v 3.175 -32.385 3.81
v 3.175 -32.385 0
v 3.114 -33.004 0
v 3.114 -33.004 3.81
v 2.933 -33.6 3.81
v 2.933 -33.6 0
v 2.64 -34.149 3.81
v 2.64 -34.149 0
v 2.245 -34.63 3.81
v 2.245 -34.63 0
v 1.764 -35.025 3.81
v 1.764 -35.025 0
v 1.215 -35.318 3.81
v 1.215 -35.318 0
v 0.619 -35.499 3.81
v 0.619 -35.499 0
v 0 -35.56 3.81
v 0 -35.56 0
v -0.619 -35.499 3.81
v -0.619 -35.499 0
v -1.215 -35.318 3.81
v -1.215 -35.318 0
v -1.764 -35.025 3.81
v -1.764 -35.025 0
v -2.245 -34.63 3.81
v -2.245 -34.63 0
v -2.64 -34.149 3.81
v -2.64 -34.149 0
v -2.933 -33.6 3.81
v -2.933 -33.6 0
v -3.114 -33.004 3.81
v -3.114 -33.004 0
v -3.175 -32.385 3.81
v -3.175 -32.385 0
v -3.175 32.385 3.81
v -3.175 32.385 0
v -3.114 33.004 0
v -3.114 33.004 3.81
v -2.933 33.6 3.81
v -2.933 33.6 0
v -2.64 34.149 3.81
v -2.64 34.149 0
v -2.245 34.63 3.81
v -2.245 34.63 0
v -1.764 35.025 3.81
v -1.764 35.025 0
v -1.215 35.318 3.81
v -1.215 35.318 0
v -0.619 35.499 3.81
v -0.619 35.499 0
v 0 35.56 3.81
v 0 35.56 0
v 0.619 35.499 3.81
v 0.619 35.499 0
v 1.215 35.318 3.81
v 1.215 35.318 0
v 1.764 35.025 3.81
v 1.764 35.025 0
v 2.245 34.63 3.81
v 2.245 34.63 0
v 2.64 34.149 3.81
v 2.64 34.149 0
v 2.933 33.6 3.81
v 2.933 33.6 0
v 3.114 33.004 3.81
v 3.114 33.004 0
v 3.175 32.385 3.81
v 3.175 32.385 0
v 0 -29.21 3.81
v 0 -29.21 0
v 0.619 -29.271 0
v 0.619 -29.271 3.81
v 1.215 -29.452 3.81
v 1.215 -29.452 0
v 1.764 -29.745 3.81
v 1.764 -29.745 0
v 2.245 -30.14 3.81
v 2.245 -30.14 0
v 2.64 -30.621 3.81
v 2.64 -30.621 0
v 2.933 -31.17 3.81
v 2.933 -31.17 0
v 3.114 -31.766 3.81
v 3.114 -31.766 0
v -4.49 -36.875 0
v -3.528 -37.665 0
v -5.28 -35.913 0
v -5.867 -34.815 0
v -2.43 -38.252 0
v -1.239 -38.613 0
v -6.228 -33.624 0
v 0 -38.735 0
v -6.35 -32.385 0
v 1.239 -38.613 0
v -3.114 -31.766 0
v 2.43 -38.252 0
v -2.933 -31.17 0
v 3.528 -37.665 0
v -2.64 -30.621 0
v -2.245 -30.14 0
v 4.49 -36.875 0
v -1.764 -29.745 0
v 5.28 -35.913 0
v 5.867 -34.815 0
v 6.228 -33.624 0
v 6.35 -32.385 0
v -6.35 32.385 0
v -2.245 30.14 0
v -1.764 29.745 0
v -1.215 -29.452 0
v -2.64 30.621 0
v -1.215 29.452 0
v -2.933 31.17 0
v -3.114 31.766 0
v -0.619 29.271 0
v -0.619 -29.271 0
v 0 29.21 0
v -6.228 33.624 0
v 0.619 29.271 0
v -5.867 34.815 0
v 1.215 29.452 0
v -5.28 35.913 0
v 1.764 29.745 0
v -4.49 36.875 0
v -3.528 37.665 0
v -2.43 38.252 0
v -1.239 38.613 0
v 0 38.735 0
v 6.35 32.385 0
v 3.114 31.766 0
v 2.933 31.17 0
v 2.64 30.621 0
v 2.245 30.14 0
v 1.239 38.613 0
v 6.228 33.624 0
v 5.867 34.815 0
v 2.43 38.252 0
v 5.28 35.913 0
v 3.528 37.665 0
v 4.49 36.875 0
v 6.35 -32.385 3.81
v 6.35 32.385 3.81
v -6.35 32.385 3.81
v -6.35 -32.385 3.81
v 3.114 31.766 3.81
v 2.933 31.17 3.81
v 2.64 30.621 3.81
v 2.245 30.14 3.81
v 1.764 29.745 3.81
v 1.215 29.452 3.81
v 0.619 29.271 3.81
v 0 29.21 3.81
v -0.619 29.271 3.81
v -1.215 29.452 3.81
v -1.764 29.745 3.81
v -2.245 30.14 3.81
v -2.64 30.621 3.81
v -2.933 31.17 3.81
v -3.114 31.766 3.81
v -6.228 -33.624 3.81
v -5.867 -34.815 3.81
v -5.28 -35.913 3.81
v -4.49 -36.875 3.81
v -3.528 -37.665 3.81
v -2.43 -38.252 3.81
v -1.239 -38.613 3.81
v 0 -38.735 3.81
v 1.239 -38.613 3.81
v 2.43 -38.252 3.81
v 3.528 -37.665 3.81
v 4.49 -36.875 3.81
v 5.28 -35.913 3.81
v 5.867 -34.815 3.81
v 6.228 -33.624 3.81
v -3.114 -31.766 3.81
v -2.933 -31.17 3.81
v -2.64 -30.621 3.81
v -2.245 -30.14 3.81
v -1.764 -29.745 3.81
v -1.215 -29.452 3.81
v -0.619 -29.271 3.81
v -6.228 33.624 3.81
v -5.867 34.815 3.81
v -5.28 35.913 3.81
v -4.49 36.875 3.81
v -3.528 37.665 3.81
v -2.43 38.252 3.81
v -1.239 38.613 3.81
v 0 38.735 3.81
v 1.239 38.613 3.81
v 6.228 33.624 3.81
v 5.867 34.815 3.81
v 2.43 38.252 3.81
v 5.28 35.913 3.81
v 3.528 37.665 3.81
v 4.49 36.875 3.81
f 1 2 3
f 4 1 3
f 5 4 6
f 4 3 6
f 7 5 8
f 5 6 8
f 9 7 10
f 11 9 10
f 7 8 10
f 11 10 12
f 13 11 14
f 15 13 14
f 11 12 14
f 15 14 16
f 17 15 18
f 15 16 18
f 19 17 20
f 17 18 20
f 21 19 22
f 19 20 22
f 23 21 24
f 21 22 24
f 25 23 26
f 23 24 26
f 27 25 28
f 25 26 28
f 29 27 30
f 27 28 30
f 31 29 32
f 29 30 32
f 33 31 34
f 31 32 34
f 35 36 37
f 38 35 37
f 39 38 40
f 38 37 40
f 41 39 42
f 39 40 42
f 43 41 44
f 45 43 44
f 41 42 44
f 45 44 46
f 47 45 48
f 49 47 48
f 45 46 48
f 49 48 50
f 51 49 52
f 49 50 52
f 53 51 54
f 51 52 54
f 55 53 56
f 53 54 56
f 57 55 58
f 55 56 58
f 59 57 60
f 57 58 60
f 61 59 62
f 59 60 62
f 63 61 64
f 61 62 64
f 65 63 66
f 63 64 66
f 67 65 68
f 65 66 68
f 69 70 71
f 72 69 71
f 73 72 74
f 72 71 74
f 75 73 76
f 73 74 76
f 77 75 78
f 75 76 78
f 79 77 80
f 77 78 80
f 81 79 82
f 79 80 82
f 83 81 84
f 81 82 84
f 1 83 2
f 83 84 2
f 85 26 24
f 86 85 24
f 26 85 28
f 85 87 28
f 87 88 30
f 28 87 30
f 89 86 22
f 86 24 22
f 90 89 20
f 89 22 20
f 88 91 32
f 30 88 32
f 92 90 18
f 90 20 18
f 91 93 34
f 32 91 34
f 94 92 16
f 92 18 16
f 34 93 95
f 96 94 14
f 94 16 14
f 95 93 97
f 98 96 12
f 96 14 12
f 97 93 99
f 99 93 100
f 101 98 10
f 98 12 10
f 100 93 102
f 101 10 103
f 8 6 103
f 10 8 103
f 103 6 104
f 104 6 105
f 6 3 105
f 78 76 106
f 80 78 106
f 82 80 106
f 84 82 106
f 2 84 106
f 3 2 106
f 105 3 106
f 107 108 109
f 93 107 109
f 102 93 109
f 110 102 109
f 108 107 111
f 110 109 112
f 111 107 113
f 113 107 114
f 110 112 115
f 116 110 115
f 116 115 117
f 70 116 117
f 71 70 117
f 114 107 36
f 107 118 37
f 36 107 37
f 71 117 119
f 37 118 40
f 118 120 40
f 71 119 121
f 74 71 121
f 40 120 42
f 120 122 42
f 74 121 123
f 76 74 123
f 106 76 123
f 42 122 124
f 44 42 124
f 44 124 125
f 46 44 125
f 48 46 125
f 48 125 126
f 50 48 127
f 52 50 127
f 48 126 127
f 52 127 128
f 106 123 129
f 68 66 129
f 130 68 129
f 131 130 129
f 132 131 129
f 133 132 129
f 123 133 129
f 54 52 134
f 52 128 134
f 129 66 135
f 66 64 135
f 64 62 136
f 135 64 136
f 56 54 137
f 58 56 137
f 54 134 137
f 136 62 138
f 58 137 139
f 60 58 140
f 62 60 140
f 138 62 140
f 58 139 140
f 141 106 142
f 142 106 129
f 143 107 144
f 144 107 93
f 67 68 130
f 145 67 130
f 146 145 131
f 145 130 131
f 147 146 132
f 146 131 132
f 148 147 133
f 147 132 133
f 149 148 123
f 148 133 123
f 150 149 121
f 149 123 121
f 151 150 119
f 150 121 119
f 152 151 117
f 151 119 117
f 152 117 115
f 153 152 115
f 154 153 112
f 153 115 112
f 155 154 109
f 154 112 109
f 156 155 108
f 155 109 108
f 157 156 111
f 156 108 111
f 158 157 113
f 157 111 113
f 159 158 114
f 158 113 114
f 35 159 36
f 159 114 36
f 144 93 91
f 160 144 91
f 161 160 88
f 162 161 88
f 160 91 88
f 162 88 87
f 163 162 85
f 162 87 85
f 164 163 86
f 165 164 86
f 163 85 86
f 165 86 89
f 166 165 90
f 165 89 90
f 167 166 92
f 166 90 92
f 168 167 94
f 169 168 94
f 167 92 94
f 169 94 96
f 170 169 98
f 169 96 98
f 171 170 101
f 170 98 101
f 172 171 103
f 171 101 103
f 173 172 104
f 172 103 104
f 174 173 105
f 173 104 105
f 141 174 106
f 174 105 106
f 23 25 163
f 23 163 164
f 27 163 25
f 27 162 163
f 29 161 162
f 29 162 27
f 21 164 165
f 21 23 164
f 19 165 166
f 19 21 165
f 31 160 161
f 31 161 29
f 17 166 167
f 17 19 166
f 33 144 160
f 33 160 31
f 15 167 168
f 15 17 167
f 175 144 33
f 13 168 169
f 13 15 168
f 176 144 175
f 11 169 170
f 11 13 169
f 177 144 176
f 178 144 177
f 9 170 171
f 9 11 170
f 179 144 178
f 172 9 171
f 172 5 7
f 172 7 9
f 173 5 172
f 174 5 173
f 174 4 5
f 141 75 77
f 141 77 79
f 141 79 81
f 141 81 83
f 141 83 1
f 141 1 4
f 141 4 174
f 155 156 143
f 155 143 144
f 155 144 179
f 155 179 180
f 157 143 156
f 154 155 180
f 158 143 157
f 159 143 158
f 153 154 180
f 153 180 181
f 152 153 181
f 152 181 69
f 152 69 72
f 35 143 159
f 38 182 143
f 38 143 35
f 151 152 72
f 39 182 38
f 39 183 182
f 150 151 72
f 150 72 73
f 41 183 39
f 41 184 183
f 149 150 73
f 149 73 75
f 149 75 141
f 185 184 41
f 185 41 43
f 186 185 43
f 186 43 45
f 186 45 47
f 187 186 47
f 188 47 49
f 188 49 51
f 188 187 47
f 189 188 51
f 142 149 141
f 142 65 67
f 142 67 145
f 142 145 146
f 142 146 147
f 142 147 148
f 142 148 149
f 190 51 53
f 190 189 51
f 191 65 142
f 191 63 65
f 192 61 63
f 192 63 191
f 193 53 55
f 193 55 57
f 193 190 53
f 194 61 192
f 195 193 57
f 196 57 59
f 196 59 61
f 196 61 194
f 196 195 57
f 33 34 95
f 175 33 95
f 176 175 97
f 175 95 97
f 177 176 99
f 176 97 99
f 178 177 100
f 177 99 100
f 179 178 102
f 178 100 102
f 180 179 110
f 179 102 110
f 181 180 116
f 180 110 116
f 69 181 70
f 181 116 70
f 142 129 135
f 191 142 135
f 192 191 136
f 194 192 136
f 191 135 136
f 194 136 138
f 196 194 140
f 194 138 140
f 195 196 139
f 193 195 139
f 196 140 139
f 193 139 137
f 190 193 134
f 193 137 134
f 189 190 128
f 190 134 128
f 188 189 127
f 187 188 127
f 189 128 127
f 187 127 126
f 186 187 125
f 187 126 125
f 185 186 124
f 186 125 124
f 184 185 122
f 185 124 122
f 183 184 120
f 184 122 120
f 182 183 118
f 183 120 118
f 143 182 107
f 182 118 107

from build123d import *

# Parameters (mm, degrees)
F1_DEPTH = 3.81


with BuildPart() as f1:
    # F0 (on Top) → F1 (new body)
    with BuildSketch(Plane.XY):
        with BuildLine():
            Line((0, 0), (0, 29.21))
            ThreePointArc((0, 29.21), (-2.245064, 30.139936), (-3.175, 32.385))
            Line((-3.175, 32.385), (-6.35, 32.385))
            Line((-6.35, 32.385), (-6.35, -32.385))
            Line((-6.35, -32.385), (-3.175, -32.385))
            ThreePointArc((-3.175, -32.385), (-2.245064, -30.139936), (0, -29.21))
            Line((0, -29.21), (0, 0))
        make_face()
        with BuildLine():
            ThreePointArc((3.175, 32.385), (2.245064, 30.139936), (0, 29.21))
            Line((0, 29.21), (0, 0))
            Line((0, 0), (0, -29.21))
            ThreePointArc((0, -29.21), (2.245064, -30.139936), (3.175, -32.385))
            Line((3.175, -32.385), (6.35, -32.385))
            Line((6.35, -32.385), (6.35, 32.385))
            Line((6.35, 32.385), (3.175, 32.385))
        make_face()
        with BuildLine():
            ThreePointArc((-3.175, 32.385), (0, 35.56), (3.175, 32.385))
            Line((3.175, 32.385), (6.35, 32.385))
            ThreePointArc((6.35, 32.385), (0, 38.735), (-6.35, 32.385))
            Line((-6.35, 32.385), (-3.175, 32.385))
        make_face()
        with BuildLine():
            ThreePointArc((-6.35, -32.385), (0, -38.735), (6.35, -32.385))
            Line((6.35, -32.385), (3.175, -32.385))
            ThreePointArc((3.175, -32.385), (0, -35.56), (-3.175, -32.385))
            Line((-3.175, -32.385), (-6.35, -32.385))
        make_face()
    extrude(amount=F1_DEPTH)


solid = f1.part
